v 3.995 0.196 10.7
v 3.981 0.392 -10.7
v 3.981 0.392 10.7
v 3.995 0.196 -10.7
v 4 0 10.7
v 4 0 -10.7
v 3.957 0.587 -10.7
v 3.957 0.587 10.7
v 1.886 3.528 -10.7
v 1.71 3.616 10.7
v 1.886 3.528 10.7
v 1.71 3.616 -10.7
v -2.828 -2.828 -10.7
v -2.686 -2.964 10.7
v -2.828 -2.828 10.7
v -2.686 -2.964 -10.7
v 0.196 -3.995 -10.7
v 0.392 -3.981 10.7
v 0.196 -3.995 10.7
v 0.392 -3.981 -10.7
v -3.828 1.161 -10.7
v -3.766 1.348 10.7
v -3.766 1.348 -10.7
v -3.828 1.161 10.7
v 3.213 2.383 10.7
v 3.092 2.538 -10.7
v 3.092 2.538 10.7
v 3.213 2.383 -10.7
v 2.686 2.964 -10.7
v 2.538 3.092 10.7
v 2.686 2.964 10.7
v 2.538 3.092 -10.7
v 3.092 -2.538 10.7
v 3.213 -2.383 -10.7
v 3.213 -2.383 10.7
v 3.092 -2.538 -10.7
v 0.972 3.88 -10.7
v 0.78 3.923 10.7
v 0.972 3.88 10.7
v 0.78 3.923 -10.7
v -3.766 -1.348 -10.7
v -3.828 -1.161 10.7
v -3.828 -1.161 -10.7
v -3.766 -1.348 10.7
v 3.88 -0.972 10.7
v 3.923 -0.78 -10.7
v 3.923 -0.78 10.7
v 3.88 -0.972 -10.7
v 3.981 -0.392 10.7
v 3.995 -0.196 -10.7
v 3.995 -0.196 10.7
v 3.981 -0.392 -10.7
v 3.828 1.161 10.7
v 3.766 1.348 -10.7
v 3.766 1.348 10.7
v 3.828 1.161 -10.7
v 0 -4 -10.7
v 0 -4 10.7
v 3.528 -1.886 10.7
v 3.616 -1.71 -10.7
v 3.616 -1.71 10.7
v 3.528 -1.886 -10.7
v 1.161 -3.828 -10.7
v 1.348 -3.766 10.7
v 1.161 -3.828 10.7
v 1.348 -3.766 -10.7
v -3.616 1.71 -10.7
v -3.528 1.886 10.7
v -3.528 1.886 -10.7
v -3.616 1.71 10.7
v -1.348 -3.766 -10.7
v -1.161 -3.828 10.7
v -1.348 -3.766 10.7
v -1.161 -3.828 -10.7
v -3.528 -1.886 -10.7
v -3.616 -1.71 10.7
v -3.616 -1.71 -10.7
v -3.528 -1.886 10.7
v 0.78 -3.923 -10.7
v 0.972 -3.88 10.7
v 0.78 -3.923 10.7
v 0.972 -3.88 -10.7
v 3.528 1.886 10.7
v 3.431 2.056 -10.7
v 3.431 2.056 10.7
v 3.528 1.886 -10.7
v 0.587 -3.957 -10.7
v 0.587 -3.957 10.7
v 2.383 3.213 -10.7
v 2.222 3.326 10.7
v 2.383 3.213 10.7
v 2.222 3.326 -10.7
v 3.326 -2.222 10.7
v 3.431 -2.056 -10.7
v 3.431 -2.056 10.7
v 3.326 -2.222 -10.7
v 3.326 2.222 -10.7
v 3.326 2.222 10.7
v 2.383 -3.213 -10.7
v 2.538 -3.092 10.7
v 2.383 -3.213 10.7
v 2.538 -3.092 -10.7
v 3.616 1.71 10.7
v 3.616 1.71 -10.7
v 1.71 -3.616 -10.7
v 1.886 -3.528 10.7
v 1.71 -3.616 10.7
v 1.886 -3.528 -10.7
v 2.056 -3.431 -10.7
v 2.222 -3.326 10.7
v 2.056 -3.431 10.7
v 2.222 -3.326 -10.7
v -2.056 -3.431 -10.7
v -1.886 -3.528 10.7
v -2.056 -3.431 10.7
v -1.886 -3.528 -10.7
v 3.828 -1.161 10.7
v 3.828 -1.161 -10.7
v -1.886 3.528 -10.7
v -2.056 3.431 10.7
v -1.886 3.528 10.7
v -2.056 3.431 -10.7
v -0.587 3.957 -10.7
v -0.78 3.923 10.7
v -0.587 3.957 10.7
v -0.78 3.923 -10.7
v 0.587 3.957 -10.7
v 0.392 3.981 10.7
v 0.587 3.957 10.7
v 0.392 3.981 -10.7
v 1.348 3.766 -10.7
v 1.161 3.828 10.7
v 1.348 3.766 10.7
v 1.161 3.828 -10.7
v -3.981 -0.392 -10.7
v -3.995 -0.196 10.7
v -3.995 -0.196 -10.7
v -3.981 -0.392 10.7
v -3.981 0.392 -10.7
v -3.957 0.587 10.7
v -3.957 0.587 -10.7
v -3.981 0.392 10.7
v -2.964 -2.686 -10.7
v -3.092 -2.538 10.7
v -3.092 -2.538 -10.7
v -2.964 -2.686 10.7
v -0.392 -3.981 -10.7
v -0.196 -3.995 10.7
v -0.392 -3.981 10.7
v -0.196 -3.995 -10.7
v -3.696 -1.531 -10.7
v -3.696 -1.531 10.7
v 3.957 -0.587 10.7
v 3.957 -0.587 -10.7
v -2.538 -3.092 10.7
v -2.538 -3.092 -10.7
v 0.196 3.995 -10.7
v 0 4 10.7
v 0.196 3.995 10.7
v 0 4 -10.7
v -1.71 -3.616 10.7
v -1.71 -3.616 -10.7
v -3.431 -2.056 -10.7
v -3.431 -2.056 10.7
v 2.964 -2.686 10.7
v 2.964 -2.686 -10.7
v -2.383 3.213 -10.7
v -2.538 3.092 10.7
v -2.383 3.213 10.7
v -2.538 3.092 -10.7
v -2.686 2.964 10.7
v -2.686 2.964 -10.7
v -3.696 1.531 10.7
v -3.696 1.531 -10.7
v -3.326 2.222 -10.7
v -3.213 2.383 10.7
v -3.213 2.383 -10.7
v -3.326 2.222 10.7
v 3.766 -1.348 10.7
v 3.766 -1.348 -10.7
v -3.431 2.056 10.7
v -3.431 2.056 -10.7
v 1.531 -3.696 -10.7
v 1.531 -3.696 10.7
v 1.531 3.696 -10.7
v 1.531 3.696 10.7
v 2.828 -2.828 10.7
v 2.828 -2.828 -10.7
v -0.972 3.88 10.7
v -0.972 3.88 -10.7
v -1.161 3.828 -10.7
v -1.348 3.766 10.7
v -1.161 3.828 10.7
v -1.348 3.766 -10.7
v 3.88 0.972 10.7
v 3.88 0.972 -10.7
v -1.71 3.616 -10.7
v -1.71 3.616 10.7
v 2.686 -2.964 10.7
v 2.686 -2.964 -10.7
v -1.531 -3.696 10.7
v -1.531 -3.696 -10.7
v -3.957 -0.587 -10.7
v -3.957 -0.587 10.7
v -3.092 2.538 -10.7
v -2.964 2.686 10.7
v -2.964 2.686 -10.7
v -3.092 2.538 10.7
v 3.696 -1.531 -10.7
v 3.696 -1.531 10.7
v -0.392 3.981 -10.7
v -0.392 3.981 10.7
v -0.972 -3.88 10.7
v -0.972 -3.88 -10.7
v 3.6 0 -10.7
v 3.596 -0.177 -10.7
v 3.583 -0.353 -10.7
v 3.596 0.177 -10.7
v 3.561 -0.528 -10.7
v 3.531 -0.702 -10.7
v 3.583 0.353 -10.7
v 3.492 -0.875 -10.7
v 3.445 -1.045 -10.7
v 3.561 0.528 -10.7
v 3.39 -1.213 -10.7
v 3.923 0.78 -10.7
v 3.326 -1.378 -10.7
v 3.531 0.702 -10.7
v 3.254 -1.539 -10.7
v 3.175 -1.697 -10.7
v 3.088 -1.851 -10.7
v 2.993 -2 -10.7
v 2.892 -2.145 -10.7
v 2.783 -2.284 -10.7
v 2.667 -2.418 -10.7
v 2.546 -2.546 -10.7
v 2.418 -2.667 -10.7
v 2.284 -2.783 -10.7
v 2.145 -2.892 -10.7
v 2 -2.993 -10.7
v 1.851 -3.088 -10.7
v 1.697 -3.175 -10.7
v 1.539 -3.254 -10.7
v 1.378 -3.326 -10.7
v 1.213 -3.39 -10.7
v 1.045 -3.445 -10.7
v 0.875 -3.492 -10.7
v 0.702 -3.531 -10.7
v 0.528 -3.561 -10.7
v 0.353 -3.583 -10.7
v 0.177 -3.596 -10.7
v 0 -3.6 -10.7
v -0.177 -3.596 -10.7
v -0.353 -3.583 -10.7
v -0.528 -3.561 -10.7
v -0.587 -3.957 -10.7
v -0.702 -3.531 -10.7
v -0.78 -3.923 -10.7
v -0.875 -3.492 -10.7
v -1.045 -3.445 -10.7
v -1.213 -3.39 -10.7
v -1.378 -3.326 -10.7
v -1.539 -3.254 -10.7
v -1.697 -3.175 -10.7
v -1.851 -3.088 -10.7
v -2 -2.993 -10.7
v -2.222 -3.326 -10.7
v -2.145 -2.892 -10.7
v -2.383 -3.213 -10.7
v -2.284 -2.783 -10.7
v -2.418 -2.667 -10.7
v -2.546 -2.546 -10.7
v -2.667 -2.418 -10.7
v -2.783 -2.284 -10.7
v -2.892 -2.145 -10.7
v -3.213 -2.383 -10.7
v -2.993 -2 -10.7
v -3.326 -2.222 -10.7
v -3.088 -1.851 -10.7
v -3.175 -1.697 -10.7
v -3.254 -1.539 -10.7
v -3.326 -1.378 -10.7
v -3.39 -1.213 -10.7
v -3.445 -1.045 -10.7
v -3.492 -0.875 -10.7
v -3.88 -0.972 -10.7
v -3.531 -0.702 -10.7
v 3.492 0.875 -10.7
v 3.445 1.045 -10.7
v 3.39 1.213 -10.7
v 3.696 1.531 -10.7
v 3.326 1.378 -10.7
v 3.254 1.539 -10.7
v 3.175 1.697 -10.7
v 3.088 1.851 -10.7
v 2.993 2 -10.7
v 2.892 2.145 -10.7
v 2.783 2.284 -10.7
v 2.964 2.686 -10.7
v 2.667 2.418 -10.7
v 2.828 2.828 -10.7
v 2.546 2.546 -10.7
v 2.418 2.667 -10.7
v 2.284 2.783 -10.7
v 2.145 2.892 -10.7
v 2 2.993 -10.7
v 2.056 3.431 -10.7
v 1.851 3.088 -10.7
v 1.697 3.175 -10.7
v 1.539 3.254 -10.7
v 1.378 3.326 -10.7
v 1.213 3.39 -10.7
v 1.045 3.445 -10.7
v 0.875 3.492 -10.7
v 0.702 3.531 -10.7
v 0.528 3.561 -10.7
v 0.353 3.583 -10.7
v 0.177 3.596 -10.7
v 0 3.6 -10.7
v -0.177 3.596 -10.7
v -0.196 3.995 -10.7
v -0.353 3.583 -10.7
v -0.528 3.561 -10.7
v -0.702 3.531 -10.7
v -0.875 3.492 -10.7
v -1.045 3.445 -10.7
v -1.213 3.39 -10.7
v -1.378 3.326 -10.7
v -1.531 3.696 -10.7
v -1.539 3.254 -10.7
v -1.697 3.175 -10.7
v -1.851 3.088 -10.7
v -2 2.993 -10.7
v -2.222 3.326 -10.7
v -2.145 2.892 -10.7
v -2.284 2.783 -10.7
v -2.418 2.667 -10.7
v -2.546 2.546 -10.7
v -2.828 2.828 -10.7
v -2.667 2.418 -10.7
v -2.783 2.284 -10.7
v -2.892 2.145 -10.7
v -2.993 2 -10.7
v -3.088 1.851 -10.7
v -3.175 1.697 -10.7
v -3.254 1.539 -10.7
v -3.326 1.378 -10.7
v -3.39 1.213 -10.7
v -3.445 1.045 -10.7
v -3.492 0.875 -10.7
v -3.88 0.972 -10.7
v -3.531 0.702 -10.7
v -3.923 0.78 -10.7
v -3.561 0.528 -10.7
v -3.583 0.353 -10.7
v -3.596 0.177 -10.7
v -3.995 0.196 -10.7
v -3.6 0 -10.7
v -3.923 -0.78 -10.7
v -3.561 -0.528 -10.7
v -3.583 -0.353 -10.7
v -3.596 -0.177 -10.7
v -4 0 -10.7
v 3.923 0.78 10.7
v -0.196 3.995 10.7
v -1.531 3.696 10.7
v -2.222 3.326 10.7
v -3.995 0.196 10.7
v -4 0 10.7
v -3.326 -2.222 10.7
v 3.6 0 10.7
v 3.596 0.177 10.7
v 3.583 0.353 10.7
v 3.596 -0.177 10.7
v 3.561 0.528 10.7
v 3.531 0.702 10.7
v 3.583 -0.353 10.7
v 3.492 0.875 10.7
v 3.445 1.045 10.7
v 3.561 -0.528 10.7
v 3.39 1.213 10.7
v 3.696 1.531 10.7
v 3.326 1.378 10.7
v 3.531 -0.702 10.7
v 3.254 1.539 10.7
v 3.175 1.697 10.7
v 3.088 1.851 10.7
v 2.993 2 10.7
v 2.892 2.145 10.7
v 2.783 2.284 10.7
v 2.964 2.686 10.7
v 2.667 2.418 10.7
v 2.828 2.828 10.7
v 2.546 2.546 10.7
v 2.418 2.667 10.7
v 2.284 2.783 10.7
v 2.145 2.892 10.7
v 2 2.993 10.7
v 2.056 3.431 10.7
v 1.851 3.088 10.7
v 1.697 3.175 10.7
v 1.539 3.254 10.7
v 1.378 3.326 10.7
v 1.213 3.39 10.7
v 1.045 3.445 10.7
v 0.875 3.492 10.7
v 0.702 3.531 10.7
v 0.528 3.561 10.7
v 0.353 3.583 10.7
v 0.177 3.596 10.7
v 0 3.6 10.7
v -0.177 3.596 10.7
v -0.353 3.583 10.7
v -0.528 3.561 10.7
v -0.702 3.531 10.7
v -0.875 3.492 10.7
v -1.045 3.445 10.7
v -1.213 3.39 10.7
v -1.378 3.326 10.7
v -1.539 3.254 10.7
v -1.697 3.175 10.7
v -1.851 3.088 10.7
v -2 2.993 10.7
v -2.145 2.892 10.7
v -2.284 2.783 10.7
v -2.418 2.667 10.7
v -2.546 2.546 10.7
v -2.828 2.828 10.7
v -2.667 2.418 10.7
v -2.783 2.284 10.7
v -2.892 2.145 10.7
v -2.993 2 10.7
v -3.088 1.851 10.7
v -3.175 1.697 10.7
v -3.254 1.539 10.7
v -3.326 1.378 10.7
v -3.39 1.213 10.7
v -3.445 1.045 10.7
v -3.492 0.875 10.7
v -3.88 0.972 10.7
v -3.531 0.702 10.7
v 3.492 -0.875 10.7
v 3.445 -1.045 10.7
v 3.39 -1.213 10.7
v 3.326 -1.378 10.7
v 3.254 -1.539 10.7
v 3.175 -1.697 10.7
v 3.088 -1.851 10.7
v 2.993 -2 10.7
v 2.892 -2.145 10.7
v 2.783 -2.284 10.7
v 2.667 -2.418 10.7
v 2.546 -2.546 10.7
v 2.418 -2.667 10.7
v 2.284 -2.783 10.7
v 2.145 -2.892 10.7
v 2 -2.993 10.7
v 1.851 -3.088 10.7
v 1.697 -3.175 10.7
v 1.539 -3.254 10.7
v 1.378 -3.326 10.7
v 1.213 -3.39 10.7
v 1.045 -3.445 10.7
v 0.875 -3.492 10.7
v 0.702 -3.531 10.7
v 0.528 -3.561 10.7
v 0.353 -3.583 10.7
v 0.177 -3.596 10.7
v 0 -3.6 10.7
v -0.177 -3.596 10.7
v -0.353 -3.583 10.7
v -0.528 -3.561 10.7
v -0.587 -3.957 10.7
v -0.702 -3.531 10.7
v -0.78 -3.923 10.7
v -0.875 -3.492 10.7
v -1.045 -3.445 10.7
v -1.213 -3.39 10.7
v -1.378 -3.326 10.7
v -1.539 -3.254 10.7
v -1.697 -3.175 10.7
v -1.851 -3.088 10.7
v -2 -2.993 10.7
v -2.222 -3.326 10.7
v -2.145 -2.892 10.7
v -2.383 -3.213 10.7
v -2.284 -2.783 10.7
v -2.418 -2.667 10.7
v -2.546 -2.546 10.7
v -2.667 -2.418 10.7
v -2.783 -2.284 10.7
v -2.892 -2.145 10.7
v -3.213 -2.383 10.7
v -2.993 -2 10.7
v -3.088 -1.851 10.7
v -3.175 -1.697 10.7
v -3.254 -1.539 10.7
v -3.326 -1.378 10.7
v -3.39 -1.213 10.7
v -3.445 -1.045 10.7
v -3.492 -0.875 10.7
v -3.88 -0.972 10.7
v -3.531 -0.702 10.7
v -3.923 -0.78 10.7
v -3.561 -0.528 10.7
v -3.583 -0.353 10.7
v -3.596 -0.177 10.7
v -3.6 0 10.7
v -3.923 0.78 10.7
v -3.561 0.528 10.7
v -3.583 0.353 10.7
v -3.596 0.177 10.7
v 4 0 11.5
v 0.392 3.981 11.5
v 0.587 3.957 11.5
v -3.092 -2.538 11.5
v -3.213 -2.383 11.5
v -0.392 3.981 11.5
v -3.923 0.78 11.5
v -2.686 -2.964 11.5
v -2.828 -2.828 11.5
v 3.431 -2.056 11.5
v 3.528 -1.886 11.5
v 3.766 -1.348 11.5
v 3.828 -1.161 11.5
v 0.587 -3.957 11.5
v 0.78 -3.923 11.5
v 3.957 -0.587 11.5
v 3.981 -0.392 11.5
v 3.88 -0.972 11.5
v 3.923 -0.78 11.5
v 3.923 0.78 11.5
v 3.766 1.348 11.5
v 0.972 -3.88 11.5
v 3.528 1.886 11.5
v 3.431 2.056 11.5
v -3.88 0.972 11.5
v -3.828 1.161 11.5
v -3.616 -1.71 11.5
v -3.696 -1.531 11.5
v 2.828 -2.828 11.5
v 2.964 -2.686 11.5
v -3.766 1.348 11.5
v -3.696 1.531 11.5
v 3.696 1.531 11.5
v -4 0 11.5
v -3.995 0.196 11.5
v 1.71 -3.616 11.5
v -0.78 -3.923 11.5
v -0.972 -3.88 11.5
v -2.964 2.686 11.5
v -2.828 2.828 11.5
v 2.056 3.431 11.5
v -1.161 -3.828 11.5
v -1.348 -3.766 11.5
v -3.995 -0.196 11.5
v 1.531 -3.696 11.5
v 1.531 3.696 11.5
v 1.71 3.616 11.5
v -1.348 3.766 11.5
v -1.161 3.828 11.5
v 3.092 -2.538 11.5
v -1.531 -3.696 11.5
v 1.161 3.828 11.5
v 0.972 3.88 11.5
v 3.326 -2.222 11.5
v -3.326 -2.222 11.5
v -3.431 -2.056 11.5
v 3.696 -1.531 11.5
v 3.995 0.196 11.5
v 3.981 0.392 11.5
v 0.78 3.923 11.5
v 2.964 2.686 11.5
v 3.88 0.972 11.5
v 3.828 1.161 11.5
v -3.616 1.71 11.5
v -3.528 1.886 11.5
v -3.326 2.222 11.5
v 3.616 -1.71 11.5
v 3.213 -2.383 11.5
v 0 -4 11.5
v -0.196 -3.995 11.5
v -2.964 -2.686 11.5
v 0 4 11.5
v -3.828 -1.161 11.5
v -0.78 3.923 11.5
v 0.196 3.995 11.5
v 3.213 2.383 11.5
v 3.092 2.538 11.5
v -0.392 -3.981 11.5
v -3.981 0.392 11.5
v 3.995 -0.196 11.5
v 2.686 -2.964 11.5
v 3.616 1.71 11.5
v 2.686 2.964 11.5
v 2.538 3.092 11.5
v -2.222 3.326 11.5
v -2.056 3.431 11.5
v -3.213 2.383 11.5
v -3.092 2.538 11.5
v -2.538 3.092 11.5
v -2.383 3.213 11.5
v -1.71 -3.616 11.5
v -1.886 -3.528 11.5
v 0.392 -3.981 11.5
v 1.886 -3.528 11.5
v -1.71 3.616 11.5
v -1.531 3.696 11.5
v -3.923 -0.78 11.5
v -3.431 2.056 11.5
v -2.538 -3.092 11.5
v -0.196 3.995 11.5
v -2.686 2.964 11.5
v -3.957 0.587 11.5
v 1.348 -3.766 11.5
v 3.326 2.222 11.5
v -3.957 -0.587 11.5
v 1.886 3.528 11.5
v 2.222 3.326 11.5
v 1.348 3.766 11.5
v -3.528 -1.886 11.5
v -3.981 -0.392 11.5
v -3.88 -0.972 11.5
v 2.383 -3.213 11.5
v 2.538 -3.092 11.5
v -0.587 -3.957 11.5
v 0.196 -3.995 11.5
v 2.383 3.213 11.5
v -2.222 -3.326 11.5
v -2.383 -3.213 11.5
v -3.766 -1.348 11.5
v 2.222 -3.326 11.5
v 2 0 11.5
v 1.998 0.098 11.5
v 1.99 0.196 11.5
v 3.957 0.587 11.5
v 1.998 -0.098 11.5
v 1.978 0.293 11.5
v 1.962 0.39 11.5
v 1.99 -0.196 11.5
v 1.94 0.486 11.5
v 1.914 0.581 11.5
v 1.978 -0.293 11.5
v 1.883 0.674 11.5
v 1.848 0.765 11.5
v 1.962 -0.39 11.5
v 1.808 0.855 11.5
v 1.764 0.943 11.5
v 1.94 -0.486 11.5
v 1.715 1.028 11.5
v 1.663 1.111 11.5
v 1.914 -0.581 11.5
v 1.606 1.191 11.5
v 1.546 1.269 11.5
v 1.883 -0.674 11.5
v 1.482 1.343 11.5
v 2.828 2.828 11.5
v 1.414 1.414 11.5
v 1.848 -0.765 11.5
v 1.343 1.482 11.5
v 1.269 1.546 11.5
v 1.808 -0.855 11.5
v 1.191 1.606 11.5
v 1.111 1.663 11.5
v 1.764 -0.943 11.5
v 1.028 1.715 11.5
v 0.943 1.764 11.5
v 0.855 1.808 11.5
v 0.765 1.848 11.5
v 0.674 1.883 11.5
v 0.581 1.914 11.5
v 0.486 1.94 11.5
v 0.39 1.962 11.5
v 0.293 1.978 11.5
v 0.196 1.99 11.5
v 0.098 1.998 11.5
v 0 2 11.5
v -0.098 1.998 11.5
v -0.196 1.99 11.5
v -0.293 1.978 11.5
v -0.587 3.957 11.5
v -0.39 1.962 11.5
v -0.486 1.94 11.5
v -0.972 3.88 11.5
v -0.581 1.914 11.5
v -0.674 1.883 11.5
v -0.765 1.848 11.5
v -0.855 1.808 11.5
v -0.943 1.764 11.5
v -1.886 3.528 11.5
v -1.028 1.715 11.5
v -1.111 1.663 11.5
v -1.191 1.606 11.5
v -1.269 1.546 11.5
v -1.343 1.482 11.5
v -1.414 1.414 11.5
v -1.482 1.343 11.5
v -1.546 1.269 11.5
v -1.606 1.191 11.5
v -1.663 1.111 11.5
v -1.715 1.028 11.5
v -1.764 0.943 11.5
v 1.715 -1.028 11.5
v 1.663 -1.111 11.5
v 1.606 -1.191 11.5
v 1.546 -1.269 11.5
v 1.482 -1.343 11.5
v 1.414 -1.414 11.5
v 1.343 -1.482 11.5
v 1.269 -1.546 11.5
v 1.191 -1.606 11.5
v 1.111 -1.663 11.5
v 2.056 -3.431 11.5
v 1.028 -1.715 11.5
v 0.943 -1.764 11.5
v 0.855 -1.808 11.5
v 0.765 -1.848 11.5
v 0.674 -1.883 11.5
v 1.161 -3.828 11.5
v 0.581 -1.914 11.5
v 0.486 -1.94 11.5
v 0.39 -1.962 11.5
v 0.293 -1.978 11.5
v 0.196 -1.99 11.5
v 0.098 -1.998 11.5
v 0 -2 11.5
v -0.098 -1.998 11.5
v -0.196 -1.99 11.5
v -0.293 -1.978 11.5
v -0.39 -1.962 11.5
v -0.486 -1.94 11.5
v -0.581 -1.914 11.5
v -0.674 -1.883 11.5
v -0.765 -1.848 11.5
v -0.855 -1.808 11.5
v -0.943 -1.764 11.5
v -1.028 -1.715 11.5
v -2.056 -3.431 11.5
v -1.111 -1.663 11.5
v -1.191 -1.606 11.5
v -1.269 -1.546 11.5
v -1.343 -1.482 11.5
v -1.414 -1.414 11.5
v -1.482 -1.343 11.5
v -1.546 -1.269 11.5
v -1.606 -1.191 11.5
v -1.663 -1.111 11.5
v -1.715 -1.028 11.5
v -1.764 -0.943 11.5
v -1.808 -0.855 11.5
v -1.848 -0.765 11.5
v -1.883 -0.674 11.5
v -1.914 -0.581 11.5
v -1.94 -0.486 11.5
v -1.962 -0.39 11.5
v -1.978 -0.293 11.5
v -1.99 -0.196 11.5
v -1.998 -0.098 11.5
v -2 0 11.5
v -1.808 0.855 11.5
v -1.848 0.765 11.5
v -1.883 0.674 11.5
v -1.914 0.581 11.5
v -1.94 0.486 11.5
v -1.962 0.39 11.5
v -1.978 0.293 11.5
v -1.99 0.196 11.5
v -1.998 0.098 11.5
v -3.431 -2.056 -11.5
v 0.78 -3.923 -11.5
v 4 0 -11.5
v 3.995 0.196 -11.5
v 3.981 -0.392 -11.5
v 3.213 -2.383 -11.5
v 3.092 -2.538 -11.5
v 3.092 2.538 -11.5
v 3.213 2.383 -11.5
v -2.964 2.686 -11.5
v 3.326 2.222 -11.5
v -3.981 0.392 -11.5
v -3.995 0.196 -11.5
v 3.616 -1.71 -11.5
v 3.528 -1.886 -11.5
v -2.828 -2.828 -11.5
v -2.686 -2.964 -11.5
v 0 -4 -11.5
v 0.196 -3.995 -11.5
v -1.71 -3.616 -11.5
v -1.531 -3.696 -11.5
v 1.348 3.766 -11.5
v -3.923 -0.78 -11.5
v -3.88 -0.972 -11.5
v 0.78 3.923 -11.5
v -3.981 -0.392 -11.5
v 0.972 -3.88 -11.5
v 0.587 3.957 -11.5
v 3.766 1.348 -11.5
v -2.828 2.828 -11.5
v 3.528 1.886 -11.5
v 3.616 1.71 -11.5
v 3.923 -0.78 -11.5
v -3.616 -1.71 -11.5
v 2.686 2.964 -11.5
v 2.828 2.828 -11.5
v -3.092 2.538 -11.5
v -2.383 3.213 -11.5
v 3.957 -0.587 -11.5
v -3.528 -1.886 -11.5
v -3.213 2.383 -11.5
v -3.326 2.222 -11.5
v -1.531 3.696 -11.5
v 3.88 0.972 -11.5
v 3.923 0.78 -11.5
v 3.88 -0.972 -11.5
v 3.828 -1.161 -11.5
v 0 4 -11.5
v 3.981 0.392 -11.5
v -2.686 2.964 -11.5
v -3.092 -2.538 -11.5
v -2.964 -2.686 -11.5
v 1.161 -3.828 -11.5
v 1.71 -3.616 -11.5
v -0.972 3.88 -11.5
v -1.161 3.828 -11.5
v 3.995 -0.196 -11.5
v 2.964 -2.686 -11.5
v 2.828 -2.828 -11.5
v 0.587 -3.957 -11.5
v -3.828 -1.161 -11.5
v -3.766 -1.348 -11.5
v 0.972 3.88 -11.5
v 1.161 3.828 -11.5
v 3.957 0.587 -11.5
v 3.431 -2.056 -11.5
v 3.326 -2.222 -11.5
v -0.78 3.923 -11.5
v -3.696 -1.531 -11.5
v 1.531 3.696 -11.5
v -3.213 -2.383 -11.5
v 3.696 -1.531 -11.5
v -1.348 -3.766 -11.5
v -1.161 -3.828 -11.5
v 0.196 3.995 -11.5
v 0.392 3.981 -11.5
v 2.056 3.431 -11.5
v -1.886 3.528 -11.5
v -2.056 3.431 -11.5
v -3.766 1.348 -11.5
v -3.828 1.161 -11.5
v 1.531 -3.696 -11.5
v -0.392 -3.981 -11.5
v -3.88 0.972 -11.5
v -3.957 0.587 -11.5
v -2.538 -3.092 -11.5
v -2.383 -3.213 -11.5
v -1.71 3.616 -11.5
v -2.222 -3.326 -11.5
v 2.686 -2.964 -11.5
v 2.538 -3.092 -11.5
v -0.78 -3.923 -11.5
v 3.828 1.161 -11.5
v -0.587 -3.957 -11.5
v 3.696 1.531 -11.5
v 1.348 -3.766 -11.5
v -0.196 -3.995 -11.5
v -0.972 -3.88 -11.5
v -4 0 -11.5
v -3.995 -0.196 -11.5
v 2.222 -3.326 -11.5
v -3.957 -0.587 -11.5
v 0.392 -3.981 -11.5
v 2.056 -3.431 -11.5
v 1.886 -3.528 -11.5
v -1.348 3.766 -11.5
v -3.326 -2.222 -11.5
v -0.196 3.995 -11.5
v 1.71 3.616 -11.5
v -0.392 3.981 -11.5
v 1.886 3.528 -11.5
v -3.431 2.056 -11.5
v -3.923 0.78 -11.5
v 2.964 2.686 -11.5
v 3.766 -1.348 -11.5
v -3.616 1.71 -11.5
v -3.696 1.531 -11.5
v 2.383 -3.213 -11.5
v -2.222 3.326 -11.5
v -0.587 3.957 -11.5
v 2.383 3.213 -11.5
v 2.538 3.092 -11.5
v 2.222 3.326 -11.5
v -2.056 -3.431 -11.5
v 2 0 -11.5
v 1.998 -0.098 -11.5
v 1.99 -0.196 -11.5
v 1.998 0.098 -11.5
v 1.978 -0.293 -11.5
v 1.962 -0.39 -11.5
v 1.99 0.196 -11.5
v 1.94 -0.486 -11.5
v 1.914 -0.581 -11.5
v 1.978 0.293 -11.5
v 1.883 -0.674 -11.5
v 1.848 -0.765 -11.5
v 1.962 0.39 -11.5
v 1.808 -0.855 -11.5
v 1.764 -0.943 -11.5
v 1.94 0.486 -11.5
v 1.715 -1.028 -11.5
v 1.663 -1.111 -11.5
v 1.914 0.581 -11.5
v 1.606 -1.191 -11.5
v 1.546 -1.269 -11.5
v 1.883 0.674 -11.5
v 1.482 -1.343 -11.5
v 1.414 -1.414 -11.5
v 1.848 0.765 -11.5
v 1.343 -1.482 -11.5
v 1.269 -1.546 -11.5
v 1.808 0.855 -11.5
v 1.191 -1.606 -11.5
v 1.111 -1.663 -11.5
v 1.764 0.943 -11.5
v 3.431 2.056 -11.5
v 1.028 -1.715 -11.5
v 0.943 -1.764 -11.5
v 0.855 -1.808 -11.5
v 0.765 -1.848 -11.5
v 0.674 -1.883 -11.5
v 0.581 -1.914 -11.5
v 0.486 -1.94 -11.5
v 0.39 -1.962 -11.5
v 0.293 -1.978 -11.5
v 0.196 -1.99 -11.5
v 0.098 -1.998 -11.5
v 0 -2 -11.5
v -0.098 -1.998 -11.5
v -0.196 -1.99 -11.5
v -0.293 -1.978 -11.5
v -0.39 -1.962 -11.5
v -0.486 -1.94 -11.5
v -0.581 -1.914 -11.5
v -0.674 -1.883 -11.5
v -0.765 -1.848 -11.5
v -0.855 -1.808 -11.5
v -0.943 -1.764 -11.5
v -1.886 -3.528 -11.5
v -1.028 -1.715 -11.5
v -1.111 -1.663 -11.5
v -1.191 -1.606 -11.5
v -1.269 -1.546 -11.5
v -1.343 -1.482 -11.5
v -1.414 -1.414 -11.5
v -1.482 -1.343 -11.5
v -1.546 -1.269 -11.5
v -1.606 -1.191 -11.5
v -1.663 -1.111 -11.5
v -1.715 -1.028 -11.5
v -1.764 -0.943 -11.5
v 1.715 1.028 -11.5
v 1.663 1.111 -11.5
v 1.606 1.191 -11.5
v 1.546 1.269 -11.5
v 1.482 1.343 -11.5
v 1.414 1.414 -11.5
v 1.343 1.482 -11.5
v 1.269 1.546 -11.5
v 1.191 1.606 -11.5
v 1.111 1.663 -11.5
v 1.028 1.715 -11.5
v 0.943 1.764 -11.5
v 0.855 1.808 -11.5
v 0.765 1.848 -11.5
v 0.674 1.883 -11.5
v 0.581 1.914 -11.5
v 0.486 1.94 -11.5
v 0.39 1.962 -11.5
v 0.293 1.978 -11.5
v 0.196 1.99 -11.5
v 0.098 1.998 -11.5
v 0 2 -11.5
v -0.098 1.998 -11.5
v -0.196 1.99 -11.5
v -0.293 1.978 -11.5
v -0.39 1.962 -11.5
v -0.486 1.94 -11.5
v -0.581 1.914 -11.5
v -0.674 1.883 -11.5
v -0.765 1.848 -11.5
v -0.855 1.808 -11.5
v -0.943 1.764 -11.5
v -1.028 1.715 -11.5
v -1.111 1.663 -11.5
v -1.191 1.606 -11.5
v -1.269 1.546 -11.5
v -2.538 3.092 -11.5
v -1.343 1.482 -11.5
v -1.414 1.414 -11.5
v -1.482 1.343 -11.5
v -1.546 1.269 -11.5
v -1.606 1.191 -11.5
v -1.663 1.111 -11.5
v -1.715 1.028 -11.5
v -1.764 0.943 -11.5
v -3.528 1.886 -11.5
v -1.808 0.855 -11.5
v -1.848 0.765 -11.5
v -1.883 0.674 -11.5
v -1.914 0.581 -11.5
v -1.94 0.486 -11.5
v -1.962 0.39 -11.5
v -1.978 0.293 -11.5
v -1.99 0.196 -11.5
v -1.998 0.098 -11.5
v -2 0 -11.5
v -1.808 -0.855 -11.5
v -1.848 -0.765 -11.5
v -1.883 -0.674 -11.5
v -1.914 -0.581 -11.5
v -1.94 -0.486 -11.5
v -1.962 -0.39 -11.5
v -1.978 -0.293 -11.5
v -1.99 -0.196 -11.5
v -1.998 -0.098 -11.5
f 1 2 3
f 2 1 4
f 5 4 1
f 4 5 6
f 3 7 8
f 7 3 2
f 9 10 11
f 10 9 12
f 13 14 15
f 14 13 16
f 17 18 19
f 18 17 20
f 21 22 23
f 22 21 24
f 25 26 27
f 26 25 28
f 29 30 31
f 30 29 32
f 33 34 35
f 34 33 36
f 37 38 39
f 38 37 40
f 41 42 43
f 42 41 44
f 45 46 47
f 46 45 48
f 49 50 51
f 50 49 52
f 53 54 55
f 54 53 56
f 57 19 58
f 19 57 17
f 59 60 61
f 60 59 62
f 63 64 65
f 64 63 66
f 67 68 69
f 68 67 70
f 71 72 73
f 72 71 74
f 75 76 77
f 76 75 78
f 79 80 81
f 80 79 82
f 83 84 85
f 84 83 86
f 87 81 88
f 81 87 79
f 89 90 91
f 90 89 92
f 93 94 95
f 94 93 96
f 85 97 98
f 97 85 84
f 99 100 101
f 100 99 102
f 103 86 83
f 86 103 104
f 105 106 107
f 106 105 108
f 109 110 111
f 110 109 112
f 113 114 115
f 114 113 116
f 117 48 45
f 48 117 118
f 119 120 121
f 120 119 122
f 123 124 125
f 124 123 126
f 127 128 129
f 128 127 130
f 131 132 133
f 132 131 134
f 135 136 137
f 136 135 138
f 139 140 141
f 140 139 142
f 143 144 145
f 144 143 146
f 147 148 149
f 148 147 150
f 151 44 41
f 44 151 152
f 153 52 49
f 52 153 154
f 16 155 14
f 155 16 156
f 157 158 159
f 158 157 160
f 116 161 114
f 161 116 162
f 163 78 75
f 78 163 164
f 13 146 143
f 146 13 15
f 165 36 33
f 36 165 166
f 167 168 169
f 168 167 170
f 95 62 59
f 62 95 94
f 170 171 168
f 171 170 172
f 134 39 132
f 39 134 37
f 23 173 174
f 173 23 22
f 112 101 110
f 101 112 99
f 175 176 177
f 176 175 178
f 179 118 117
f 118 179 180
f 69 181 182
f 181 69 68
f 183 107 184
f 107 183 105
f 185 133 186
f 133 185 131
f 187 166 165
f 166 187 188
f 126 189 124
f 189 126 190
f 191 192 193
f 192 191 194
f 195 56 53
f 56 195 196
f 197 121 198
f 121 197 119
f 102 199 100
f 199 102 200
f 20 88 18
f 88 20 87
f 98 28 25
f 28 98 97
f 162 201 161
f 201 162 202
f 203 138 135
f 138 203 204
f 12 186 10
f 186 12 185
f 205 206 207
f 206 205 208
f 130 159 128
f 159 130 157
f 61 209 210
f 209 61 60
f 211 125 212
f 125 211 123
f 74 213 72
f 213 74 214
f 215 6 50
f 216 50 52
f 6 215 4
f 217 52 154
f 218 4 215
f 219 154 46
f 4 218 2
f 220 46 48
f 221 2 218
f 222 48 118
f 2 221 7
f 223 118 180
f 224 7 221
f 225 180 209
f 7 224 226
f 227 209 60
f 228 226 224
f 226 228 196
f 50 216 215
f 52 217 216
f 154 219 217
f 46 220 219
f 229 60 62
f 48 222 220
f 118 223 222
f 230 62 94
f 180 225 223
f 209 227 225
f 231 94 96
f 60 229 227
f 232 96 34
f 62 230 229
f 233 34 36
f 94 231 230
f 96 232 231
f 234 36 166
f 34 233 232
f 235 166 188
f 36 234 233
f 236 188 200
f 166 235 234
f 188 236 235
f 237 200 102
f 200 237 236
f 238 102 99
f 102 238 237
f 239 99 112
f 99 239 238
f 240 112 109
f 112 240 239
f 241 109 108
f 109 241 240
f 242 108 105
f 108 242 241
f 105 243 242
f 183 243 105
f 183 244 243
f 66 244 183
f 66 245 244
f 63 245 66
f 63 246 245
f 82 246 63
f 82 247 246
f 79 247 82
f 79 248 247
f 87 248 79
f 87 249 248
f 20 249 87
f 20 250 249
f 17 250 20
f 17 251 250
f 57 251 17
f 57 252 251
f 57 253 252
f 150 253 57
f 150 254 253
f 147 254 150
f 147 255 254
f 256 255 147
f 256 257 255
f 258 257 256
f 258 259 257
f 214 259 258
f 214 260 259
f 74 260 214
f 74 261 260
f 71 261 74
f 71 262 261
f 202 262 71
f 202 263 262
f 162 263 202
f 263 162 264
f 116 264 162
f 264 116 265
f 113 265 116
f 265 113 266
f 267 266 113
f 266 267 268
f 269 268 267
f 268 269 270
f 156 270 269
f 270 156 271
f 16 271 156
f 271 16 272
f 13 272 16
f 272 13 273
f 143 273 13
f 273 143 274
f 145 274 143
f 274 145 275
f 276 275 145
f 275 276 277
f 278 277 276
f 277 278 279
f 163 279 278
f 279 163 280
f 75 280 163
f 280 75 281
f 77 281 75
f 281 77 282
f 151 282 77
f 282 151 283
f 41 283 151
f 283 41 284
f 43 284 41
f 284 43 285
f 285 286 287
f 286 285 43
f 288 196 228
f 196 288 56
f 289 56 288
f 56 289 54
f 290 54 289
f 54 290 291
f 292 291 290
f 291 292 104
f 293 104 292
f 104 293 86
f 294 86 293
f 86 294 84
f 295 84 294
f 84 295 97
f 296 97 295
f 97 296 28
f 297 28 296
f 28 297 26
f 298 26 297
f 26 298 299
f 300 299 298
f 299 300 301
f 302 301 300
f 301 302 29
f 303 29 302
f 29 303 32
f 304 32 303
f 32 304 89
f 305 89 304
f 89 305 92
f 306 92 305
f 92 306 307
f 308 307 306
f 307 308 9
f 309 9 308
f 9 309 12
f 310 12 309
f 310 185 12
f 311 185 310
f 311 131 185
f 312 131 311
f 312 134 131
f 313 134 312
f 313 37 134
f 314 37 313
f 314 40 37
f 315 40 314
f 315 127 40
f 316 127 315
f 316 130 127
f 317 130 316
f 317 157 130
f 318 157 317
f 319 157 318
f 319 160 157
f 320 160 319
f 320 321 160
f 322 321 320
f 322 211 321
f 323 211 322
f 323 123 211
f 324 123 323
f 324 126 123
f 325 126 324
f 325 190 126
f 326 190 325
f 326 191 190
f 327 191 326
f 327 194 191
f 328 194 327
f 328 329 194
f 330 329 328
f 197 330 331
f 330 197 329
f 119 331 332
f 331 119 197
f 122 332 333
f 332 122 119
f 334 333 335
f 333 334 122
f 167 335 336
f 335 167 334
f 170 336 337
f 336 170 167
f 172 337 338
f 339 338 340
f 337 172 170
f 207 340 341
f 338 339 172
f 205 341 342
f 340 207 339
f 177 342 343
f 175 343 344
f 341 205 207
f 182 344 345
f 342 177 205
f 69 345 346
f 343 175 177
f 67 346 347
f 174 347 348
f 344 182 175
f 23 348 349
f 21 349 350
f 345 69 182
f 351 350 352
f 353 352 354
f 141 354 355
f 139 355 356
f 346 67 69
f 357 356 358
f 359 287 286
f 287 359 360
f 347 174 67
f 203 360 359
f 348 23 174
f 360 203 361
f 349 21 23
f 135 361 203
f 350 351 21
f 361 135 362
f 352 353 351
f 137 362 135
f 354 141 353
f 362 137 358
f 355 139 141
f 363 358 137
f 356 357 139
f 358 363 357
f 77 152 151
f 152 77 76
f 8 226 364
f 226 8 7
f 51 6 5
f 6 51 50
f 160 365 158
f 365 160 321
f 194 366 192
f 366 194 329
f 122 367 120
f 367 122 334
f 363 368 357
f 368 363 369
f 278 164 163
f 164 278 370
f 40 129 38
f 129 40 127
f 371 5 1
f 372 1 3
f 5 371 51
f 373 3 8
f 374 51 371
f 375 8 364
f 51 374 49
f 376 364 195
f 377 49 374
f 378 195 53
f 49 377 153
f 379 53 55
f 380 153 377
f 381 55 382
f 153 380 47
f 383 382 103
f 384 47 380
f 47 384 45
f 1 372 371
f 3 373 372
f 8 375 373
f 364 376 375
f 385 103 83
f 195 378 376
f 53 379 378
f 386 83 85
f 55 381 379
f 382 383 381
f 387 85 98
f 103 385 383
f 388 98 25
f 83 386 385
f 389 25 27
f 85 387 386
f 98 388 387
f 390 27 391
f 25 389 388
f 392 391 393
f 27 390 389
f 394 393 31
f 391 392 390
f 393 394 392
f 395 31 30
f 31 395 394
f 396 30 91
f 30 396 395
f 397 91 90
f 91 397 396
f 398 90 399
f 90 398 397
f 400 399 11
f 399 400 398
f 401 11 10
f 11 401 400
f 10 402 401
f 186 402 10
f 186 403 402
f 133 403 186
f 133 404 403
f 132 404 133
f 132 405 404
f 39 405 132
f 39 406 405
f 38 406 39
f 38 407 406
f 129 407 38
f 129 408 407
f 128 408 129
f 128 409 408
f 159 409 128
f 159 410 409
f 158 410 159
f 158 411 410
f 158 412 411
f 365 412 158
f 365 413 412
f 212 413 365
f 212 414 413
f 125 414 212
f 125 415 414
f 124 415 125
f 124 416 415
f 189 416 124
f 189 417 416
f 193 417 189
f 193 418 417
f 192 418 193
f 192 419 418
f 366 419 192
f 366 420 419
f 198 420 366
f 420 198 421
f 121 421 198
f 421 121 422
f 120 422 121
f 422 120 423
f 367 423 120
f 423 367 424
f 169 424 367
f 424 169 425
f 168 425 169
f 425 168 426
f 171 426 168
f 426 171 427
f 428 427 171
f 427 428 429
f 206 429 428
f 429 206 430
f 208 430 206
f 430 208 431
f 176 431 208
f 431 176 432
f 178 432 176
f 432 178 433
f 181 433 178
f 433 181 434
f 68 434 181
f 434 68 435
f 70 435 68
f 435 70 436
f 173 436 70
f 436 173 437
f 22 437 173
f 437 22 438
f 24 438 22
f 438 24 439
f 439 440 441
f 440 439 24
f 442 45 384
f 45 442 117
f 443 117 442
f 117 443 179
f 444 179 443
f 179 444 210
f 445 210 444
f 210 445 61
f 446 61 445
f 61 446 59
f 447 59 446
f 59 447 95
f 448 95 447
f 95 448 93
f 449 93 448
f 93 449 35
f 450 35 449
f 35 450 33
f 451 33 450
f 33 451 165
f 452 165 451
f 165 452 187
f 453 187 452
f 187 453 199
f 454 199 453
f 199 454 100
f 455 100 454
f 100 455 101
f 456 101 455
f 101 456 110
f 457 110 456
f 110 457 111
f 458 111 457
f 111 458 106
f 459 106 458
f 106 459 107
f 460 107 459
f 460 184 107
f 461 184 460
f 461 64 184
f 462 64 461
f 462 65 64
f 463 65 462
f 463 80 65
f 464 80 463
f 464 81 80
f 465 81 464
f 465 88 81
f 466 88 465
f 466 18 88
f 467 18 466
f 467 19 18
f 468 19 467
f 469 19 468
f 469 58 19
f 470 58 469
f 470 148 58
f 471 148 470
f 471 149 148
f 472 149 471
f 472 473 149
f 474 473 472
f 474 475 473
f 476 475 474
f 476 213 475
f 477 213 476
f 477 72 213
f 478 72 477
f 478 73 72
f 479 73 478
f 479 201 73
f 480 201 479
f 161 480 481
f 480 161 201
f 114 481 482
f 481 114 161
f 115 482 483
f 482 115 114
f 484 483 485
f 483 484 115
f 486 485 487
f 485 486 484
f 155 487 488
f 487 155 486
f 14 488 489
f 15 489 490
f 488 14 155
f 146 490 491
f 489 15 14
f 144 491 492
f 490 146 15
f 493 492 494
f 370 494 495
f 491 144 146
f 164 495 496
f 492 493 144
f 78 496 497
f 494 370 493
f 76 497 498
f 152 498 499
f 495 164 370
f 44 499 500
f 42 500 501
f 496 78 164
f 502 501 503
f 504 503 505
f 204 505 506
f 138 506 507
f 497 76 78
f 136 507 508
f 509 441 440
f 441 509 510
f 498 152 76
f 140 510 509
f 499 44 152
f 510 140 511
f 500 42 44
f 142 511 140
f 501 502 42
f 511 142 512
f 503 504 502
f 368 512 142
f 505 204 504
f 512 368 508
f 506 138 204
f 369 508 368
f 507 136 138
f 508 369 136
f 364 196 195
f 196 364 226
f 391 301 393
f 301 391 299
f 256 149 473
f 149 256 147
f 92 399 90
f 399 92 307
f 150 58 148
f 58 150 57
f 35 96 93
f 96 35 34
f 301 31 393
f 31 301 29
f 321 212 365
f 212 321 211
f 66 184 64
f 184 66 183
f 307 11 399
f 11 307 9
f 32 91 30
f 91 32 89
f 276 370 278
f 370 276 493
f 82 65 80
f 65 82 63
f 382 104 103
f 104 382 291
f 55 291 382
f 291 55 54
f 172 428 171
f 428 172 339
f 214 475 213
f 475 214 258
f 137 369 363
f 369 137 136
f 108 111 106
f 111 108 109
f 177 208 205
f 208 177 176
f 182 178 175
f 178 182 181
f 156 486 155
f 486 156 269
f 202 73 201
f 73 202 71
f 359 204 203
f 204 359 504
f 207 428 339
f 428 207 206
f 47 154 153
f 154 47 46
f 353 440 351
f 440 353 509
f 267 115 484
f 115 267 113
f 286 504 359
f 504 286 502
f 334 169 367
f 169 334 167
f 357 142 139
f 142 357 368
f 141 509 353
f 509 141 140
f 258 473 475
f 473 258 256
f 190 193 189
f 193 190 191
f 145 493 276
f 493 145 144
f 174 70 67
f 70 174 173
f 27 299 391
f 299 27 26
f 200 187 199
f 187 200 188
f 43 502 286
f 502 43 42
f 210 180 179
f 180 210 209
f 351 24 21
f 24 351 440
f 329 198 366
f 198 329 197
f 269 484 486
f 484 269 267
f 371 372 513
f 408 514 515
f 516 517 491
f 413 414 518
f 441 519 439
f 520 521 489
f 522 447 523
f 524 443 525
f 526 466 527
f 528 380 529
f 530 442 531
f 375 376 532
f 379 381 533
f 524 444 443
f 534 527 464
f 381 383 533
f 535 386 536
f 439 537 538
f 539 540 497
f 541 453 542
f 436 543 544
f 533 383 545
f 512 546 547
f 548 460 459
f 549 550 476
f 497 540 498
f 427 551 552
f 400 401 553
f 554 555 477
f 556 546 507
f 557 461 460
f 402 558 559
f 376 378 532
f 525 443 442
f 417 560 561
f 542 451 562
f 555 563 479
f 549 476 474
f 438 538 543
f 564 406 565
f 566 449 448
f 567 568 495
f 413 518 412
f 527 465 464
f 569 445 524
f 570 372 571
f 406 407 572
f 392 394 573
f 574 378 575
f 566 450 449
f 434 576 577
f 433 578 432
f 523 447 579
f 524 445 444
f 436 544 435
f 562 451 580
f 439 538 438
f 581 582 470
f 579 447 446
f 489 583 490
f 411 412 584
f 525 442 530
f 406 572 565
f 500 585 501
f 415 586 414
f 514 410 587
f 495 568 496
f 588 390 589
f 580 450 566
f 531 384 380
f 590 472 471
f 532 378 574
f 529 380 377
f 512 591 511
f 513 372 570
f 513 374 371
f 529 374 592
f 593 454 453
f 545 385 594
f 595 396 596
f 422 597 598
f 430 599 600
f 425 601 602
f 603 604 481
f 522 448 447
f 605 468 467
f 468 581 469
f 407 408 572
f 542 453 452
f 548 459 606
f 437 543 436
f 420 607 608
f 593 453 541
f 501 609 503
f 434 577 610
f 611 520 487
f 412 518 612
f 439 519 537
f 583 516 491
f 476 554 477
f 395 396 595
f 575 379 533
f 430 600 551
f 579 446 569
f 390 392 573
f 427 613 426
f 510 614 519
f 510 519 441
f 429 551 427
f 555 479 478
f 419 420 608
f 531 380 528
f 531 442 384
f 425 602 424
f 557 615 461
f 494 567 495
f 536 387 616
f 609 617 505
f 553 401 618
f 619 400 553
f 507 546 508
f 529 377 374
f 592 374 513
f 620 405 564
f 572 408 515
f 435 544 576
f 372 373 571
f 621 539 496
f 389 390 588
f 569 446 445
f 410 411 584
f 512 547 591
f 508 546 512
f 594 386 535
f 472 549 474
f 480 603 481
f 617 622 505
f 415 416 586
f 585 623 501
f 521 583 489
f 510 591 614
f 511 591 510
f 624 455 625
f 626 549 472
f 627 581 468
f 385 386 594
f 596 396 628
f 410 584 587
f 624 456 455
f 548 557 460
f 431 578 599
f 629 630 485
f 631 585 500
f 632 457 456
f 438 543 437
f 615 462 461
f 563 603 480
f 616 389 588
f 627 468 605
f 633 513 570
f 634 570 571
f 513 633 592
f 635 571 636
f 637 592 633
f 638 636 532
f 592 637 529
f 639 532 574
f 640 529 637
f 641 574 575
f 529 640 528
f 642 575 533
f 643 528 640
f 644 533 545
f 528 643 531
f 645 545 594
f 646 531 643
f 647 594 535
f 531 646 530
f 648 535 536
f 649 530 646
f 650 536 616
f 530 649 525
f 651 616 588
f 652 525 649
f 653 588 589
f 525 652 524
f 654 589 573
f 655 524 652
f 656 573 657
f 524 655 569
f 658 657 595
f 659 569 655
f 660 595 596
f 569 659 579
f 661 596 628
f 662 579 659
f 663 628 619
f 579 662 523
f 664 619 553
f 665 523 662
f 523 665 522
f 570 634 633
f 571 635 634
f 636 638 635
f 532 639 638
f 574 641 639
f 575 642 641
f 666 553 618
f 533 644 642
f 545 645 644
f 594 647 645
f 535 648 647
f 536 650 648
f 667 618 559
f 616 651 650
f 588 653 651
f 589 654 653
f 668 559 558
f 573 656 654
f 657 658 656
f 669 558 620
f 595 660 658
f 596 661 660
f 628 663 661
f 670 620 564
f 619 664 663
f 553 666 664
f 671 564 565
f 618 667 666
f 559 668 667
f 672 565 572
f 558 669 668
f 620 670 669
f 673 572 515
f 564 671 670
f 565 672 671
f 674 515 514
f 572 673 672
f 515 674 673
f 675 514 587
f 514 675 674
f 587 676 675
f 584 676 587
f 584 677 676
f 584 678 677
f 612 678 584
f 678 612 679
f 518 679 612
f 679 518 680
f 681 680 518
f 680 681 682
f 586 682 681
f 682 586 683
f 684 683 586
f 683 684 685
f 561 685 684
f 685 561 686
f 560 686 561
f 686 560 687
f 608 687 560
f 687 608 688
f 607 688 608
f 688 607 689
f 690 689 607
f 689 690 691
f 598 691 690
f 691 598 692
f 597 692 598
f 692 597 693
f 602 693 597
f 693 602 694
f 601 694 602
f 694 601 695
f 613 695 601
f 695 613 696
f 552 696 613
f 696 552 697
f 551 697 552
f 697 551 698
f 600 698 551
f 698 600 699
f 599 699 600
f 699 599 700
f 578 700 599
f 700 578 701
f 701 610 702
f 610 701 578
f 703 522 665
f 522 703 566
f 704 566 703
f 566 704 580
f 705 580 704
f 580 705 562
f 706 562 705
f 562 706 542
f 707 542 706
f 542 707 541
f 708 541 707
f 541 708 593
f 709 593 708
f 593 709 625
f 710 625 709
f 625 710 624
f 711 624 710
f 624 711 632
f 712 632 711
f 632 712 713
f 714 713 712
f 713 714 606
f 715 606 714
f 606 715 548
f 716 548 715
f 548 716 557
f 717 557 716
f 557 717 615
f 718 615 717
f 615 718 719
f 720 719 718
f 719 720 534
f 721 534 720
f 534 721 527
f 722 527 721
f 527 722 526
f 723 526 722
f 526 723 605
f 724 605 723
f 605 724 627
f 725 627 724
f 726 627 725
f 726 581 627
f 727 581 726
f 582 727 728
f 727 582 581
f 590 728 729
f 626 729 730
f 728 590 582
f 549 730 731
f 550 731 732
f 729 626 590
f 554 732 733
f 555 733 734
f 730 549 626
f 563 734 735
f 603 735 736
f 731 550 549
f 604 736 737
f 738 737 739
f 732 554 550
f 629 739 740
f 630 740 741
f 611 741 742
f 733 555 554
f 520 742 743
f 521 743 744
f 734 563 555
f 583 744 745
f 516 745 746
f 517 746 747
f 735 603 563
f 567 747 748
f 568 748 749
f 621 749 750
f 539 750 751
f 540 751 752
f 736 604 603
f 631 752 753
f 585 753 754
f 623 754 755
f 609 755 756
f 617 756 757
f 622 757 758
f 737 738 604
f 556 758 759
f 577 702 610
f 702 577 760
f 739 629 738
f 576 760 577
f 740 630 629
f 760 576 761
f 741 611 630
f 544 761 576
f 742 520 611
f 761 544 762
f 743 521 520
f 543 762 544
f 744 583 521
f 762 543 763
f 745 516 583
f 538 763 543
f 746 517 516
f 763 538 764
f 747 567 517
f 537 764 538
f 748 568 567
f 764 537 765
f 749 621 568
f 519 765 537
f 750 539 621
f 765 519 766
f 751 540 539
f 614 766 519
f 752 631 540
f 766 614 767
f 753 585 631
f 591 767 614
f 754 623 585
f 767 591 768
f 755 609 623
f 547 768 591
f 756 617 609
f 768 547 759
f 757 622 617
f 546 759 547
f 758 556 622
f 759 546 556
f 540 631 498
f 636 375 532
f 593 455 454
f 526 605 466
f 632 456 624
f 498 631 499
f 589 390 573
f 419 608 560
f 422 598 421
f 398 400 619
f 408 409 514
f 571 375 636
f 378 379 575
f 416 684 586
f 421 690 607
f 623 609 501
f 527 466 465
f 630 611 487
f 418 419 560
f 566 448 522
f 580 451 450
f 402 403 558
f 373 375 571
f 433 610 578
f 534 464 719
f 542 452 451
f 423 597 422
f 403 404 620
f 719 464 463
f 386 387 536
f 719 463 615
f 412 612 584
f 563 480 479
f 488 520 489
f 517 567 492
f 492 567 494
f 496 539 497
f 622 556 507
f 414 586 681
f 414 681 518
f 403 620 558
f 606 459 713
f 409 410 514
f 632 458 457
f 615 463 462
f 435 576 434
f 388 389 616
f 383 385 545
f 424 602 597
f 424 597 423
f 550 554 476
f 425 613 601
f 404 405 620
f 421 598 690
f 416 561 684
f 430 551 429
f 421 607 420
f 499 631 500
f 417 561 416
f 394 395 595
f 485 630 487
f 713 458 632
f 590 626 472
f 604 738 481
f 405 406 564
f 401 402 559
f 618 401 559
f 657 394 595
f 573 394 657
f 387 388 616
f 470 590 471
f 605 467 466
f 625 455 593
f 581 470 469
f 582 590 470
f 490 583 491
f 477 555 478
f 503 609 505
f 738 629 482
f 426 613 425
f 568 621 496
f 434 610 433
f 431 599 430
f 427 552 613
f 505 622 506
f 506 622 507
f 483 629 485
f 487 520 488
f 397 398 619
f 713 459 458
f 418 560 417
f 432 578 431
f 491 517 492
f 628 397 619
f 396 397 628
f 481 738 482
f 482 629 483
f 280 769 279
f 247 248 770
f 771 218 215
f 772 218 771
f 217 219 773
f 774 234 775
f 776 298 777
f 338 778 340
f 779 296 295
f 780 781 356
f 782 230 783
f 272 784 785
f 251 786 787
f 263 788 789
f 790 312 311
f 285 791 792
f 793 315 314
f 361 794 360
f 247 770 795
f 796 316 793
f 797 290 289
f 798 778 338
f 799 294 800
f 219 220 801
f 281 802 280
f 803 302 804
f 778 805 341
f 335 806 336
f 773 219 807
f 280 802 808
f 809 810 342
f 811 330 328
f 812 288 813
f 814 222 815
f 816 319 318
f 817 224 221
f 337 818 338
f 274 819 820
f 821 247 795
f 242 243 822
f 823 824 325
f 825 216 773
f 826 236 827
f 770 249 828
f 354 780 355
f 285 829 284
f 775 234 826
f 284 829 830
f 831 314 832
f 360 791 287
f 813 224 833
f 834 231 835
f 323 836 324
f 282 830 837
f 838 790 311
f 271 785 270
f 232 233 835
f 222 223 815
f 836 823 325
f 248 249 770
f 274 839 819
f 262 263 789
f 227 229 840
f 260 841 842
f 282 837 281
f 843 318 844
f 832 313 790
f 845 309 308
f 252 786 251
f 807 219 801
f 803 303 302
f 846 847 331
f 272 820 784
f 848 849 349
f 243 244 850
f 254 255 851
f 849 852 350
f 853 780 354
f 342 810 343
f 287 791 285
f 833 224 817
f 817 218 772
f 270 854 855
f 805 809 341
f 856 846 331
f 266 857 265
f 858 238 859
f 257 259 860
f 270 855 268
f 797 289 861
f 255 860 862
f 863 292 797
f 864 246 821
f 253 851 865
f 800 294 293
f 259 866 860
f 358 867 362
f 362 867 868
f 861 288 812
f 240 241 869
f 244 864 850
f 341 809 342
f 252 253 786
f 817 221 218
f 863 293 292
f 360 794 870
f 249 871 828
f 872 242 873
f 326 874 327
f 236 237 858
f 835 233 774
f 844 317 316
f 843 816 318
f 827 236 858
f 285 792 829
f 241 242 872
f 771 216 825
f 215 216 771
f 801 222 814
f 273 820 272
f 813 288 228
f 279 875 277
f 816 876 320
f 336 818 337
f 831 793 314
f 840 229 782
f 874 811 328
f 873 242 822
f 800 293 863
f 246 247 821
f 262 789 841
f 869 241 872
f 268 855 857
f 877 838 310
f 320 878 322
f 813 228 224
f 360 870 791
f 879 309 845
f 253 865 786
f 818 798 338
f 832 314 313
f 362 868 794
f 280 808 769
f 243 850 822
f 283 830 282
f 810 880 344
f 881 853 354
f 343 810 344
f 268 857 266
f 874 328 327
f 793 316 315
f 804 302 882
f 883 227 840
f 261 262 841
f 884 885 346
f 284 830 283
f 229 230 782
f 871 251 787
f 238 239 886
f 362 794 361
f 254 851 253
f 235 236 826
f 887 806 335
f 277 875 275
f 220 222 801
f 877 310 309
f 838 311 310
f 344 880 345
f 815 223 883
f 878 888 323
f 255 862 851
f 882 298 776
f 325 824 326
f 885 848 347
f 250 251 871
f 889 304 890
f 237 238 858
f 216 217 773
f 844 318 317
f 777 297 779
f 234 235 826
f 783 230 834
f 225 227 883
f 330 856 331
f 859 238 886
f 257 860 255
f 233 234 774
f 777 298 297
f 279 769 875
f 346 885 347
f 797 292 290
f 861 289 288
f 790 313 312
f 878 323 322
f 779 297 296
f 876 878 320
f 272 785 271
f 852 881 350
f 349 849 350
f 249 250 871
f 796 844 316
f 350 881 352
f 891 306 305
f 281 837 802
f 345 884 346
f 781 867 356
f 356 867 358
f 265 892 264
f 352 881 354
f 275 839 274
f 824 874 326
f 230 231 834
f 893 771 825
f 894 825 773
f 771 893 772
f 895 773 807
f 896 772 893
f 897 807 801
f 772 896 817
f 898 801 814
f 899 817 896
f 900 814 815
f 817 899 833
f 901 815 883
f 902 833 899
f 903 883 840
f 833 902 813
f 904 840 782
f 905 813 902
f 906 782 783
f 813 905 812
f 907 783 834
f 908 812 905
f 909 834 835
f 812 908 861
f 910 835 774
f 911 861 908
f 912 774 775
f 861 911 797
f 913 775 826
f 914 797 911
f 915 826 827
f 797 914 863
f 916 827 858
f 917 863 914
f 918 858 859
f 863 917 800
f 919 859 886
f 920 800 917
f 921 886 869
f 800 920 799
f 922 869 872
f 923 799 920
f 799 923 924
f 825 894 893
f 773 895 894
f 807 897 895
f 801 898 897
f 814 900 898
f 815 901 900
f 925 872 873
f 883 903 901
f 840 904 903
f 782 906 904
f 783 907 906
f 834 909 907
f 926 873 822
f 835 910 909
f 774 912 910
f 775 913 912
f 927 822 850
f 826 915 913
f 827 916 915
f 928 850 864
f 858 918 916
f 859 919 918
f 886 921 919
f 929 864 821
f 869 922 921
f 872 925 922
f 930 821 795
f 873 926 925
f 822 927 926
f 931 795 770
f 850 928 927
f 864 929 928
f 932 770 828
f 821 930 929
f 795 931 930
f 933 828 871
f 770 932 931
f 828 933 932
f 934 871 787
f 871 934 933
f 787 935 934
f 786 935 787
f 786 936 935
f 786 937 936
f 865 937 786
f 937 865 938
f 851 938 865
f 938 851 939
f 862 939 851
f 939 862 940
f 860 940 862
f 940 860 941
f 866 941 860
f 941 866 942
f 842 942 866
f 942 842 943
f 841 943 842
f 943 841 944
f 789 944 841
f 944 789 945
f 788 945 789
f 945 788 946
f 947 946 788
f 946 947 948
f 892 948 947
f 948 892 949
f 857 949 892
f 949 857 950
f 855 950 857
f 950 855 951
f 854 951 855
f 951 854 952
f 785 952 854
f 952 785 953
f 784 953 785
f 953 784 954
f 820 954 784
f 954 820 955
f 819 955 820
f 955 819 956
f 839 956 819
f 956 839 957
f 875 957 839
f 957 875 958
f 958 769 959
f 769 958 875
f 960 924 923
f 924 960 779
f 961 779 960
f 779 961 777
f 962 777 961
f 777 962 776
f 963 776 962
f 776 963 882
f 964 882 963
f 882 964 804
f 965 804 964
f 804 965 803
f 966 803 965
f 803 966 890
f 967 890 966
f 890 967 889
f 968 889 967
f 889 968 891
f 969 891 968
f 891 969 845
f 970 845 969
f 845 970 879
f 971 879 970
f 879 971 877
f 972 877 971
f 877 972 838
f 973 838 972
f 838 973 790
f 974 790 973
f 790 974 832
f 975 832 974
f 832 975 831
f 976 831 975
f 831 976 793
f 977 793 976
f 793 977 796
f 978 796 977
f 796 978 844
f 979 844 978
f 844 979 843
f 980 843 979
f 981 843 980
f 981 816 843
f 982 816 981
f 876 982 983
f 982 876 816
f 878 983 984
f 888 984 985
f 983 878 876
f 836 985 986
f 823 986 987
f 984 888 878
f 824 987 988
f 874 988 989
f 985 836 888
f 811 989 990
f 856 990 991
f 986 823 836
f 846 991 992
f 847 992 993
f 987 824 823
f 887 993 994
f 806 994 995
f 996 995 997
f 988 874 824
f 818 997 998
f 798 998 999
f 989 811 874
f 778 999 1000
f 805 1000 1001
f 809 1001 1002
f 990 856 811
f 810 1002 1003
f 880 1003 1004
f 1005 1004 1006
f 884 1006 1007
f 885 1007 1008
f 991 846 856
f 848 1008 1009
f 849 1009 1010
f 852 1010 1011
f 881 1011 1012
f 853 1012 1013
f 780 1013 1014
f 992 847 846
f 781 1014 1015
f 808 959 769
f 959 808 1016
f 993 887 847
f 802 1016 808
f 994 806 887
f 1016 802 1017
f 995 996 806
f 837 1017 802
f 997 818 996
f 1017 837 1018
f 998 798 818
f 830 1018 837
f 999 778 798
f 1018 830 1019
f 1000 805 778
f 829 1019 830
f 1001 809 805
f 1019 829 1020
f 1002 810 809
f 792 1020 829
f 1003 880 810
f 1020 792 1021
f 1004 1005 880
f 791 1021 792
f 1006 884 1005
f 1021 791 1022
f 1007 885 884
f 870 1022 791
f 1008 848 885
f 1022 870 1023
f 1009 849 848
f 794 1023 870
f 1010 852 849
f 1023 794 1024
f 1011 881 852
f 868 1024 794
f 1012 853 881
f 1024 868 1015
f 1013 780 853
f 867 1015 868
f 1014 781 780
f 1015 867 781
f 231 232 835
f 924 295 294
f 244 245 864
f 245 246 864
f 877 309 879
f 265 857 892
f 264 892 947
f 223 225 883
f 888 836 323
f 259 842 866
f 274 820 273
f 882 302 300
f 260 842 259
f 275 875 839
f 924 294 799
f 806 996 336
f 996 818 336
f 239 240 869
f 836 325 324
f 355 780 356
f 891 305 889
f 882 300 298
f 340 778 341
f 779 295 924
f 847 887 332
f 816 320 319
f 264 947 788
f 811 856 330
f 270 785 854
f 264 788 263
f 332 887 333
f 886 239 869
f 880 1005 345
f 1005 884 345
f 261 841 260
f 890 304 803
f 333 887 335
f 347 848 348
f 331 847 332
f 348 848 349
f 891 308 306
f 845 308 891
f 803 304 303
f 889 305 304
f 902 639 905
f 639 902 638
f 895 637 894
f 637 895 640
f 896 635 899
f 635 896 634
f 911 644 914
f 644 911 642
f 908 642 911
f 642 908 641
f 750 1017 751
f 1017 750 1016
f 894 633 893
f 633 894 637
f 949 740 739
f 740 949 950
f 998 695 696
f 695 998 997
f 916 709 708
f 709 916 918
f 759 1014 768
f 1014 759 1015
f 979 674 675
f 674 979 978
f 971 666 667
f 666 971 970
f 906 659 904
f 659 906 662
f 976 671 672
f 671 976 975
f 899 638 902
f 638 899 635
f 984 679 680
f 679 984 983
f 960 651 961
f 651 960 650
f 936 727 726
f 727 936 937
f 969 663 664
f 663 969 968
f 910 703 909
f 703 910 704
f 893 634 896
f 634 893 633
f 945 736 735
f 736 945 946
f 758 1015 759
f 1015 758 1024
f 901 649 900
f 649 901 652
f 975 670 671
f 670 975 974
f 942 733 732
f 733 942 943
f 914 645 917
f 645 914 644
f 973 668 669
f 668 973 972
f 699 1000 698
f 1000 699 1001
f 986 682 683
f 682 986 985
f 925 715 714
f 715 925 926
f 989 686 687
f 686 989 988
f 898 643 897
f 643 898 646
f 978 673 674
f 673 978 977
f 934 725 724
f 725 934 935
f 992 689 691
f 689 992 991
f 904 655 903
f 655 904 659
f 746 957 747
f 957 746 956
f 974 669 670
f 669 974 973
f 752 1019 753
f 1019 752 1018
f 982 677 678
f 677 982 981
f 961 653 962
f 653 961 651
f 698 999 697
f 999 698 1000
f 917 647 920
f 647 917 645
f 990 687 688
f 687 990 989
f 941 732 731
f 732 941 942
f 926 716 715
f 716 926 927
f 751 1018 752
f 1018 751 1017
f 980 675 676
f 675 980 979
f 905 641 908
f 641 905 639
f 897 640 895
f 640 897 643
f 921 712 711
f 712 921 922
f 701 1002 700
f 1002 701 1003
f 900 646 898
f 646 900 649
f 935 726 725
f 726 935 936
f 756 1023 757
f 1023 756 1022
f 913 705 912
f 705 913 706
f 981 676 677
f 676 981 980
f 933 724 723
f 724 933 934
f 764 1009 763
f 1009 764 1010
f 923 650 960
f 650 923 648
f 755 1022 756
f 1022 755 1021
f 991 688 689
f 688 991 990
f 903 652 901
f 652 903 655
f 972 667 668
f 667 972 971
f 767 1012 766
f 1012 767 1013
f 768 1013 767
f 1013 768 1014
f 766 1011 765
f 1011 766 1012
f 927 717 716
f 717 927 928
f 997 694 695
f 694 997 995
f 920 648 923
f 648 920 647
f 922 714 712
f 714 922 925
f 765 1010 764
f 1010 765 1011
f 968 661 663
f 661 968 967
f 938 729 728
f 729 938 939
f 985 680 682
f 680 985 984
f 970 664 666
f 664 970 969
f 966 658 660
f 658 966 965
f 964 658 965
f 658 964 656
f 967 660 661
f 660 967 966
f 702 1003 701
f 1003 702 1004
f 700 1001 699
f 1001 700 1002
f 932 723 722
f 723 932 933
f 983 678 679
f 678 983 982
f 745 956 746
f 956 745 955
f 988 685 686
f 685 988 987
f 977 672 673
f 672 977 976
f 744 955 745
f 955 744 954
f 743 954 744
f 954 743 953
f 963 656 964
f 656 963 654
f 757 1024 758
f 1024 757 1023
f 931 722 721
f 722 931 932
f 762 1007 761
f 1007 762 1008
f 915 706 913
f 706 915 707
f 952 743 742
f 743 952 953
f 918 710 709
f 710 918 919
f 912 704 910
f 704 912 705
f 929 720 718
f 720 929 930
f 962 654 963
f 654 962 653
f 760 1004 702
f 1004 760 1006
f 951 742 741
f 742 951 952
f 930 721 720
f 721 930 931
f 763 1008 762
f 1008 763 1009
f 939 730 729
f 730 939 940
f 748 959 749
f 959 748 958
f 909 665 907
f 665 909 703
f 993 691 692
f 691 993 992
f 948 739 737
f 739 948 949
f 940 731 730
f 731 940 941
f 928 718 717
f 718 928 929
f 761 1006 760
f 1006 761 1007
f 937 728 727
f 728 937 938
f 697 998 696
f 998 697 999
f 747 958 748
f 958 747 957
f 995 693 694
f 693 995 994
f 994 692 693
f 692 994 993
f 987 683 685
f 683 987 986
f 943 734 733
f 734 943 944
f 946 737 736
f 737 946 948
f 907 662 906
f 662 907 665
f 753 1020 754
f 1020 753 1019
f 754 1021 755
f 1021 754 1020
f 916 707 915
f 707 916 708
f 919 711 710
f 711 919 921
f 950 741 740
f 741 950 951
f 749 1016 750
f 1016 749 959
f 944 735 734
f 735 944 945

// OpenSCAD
// Long linear bearing: 4.0mm bore, 8.0mm OD, 23.0mm length

$fn = 128;  // smooth bore and OD

// Parameters
bearing_length = 23.0; //[12.0:46.0:0.5]
outer_diameter = 8.0;  //[4.0:16.0:0.5]
bore_diameter  = 4.0;  //[2.0:8.0:0.5]

// Small edge break (not a full cone to a point)
chamfer_length = 0.8;  //[0.3:2.0:0.1]
chamfer_radial = 0.4;  //[0.1:1.2:0.1]

// Robust boolean overlap
overlap = 0.2; //[0.05:1.0:0.05]

// Derived
R  = outer_diameter/2;
r  = bore_diameter/2;
R2 = max(R - chamfer_radial, r + 0.01); // keep valid geometry

module bearing_complete() {
    difference() {
        // Outer body with small end chamfers (connected, single solid)
        union() {
            // Main cylinder shortened to make room for chamfers at both ends
            cylinder(h = bearing_length - 2*chamfer_length, r = R, center = true);

            // Top chamfer ring
            translate([0, 0, (bearing_length/2 - chamfer_length/2)])
                cylinder(h = chamfer_length, r1 = R2, r2 = R, center = true);

            // Bottom chamfer ring
            translate([0, 0, -(bearing_length/2 - chamfer_length/2)])
                cylinder(h = chamfer_length, r1 = R, r2 = R2, center = true);
        }

        // Through bore (round, smooth)
        cylinder(h = bearing_length + 2*overlap, r = r, center = true);
    }
}

bearing_complete();
